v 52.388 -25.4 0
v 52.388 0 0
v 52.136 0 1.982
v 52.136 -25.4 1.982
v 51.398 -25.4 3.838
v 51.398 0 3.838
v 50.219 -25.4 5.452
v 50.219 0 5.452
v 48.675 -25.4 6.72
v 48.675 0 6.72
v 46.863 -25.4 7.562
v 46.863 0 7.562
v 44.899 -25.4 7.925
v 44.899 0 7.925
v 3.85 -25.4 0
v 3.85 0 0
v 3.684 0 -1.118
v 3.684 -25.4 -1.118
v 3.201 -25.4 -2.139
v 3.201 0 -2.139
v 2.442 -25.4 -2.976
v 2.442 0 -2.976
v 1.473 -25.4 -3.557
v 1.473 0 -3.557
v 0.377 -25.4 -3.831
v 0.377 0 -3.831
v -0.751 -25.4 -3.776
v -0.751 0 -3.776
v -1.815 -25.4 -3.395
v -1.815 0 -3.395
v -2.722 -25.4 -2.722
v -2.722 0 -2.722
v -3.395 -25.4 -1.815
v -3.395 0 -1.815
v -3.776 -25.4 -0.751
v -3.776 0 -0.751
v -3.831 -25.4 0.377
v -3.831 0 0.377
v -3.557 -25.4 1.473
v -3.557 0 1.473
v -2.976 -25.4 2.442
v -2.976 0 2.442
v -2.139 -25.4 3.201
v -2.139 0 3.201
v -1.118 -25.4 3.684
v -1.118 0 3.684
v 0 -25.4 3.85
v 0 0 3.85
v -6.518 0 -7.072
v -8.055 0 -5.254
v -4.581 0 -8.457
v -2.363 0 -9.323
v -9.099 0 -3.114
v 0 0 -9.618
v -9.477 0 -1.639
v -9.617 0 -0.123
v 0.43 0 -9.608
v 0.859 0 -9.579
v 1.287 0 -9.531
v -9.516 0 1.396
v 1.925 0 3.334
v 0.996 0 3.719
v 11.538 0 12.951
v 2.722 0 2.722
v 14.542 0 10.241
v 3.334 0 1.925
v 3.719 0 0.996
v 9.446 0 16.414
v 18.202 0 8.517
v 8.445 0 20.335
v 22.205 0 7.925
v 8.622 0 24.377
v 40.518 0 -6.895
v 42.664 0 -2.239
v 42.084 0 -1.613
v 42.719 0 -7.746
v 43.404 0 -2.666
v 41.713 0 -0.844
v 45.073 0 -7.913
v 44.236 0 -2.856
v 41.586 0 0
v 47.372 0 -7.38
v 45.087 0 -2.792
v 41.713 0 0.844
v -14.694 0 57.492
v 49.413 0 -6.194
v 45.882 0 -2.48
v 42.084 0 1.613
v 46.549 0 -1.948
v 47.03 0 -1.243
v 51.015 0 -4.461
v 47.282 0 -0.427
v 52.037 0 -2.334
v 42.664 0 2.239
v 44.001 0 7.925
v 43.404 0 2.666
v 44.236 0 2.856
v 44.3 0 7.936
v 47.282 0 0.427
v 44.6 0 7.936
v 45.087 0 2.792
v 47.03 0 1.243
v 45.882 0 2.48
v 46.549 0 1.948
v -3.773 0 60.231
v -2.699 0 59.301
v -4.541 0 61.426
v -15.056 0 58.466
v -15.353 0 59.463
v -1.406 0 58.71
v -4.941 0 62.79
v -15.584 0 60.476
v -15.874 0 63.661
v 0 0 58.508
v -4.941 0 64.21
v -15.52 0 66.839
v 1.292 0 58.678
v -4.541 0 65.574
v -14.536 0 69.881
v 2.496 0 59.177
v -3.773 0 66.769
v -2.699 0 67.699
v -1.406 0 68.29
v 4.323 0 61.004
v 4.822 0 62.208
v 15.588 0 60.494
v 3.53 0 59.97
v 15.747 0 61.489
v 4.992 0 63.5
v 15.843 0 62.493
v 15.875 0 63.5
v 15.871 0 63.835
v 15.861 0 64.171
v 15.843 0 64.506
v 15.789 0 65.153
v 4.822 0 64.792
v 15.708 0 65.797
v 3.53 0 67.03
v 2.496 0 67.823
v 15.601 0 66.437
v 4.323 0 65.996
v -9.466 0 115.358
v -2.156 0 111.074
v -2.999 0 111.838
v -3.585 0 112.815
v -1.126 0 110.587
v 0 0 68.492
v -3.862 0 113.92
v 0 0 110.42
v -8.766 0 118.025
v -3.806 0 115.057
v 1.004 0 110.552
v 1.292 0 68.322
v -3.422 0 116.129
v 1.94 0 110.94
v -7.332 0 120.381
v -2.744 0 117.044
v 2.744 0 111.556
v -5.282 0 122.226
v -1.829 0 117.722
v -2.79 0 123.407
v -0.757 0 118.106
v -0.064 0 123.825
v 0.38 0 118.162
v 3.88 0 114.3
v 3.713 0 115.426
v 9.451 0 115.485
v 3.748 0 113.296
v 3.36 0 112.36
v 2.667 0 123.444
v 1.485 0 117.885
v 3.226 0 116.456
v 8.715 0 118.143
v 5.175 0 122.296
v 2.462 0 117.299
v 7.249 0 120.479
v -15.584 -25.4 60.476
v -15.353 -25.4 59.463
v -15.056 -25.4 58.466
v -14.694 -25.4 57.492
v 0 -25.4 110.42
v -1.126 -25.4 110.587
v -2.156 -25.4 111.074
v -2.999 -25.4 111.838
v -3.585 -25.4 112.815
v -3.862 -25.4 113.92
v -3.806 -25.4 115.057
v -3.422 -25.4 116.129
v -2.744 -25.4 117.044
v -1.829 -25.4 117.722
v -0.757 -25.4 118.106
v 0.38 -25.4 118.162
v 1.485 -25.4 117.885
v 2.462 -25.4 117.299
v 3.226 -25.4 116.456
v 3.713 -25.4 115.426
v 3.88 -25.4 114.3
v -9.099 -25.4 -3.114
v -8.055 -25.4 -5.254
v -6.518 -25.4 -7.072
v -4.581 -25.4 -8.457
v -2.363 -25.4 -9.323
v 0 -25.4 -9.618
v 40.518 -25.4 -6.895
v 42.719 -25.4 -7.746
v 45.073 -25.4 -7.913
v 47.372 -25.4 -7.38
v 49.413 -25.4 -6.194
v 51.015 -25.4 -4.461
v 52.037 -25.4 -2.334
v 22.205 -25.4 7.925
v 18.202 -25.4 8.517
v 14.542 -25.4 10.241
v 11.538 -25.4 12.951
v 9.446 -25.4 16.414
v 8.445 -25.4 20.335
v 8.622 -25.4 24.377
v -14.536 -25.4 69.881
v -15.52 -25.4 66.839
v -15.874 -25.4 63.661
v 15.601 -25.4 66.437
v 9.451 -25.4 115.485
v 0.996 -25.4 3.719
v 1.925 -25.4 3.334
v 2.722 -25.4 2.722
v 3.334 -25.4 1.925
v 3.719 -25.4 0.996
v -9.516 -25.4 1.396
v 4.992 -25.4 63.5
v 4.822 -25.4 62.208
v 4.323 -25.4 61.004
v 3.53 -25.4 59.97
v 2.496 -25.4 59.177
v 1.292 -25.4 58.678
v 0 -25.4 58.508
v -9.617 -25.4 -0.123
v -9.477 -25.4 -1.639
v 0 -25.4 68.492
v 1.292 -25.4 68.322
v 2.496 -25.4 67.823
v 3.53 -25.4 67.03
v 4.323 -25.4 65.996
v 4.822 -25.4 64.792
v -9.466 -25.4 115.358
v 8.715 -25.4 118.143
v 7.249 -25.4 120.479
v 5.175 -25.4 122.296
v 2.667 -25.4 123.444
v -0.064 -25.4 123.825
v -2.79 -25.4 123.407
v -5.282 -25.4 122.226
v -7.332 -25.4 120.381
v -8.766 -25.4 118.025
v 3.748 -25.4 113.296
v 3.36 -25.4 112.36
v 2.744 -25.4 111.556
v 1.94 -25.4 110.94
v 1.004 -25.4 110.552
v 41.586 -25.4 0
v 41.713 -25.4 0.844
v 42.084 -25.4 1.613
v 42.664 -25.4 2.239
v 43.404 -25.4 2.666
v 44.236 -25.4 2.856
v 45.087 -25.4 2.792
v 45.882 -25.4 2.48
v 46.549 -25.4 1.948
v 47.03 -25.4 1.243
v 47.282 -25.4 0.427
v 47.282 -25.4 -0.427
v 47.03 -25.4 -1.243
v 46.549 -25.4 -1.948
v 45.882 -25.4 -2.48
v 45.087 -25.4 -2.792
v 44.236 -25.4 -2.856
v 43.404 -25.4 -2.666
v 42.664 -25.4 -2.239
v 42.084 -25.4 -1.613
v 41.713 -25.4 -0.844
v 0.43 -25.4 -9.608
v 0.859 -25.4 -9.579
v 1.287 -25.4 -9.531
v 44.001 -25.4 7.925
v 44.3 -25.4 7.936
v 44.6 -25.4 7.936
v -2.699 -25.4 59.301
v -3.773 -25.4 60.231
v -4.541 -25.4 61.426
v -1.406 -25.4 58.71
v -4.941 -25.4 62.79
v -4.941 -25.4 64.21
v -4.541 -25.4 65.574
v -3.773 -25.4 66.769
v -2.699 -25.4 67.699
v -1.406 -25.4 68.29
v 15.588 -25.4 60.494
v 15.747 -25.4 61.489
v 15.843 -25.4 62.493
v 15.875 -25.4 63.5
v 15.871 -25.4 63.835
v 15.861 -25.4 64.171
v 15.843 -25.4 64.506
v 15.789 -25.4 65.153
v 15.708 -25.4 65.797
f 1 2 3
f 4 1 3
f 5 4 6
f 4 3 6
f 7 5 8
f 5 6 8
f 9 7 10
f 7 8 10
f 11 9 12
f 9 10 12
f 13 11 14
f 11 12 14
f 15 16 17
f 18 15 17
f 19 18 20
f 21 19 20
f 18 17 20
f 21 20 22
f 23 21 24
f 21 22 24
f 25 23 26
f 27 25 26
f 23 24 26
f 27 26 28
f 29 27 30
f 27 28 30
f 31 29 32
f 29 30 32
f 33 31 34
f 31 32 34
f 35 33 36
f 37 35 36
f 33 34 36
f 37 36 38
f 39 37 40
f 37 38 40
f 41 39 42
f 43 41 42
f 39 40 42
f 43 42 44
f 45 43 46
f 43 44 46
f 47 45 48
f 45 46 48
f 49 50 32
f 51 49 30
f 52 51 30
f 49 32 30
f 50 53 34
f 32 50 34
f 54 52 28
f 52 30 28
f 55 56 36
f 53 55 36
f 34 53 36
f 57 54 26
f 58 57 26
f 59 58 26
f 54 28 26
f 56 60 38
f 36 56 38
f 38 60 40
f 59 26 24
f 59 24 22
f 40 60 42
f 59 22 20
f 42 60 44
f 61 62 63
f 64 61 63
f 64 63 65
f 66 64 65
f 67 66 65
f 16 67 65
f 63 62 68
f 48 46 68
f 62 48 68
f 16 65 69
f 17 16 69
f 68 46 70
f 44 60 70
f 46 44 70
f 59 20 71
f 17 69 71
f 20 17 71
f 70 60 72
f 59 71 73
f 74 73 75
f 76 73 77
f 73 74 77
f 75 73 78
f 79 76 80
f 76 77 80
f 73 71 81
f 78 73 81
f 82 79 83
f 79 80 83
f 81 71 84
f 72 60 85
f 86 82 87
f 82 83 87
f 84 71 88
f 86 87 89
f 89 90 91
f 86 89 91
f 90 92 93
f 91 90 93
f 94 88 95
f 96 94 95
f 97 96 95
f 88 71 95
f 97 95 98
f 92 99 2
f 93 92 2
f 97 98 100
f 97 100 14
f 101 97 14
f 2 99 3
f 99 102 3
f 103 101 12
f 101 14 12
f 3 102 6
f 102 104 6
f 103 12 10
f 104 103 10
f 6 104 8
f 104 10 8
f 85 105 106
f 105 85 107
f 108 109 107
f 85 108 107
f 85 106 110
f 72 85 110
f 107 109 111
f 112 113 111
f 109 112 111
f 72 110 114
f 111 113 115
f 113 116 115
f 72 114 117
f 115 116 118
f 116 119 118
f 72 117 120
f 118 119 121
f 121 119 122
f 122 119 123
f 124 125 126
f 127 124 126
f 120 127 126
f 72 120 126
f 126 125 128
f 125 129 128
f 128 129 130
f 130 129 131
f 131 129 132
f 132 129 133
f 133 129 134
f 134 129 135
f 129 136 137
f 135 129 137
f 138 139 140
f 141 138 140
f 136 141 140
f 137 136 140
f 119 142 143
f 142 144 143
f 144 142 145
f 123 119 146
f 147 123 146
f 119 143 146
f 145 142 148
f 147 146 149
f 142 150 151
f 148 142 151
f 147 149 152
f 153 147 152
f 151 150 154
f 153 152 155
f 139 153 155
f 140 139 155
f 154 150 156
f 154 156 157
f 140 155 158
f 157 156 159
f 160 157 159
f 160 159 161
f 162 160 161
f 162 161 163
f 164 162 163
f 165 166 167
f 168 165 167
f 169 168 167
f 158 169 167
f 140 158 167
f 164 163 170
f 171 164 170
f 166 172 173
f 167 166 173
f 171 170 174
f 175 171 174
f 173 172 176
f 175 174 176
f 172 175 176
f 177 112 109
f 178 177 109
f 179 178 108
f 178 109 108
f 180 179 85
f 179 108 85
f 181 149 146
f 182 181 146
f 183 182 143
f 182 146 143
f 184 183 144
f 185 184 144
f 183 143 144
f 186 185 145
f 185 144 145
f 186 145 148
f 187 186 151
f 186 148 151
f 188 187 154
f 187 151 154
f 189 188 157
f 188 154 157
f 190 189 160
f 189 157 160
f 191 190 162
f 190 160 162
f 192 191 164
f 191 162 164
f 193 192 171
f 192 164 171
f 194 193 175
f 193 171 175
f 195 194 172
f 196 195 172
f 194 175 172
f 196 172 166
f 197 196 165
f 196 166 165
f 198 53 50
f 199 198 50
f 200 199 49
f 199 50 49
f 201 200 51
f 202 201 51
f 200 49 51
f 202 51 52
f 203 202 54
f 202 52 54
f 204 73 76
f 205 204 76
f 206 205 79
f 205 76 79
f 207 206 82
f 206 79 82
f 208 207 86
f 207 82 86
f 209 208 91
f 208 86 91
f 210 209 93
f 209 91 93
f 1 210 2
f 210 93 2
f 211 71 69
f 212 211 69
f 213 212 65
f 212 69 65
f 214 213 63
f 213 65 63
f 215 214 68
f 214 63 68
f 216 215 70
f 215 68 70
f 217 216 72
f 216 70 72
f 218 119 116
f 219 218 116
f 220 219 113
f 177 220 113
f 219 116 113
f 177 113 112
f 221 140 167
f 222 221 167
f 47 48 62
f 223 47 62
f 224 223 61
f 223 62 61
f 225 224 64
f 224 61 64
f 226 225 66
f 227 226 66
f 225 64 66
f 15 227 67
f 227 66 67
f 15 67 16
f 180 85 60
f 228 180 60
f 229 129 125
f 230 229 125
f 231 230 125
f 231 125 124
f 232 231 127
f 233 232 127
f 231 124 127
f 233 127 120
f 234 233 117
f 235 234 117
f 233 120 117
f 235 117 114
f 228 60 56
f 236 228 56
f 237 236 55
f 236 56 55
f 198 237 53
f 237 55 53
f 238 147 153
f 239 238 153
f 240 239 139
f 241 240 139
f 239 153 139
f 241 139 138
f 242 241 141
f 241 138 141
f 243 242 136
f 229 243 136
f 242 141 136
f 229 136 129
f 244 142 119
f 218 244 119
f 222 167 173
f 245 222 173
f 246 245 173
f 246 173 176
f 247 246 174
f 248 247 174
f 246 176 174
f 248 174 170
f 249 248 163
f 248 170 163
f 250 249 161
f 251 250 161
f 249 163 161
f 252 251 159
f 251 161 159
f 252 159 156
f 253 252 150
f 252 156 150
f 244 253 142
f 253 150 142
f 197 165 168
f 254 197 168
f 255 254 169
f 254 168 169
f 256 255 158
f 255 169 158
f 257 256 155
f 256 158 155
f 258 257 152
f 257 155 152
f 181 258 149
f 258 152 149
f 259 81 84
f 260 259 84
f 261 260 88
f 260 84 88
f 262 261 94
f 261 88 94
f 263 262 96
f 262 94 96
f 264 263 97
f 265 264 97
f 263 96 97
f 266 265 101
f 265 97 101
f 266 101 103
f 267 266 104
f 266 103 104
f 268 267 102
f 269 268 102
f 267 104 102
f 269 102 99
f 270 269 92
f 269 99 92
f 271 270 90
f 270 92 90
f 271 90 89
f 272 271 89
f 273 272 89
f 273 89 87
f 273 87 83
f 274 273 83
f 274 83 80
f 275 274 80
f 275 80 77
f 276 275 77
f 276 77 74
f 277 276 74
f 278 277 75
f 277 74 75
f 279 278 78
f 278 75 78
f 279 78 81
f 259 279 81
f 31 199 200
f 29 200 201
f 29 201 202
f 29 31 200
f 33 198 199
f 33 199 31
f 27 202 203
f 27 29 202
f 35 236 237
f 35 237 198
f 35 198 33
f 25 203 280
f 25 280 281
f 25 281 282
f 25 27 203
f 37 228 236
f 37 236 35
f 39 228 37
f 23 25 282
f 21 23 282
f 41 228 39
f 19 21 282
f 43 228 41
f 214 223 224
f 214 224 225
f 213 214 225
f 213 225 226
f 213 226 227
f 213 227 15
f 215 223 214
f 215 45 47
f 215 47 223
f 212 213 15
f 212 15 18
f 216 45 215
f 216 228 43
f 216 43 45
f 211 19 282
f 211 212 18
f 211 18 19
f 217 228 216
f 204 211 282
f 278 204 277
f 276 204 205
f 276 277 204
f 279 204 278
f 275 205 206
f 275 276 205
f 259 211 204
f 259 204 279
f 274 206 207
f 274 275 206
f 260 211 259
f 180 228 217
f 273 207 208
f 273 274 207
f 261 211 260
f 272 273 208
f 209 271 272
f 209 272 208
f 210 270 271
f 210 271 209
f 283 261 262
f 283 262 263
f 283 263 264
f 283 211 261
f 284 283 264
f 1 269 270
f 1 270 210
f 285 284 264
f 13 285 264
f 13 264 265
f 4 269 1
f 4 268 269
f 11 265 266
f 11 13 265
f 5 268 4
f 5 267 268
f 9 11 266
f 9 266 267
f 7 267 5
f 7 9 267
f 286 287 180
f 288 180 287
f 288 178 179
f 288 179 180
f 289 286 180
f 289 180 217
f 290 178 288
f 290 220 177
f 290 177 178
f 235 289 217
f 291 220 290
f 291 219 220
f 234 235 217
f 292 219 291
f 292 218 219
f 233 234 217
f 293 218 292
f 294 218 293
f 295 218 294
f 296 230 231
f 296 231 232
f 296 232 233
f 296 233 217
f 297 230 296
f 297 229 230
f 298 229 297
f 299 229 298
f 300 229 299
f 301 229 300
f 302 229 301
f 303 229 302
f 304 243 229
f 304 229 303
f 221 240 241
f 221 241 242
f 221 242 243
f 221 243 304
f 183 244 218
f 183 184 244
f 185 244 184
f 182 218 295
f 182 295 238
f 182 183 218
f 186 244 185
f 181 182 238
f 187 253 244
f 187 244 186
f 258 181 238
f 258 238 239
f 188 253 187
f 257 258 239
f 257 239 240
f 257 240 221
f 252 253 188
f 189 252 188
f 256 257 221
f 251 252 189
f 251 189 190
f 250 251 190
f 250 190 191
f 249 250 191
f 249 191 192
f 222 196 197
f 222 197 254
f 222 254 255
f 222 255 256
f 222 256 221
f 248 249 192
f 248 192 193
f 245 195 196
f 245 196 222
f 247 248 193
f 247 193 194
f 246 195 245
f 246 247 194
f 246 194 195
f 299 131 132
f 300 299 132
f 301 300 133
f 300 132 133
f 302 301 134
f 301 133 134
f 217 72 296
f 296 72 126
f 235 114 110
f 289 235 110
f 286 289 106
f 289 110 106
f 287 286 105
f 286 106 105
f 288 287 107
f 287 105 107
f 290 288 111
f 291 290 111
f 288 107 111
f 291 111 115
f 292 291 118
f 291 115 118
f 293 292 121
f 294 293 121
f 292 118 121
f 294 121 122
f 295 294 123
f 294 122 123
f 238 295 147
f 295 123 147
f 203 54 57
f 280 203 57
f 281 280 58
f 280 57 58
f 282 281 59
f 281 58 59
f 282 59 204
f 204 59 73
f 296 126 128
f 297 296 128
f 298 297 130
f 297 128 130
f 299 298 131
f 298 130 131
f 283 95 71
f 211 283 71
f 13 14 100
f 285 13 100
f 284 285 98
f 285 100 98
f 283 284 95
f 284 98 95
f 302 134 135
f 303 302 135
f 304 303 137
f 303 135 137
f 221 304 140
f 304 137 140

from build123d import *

# Parameters (mm, degrees)
F1_DEPTH = 25.4


with BuildPart() as f1:
    # F0 (on Front) → F1 (new body)
    with BuildSketch(Plane.XZ):
        with BuildLine():
            Line((-9.0993962158, -3.1143001494), (-9.5157433692, 1.3958886217))
            ThreePointArc((-9.5157433692, 1.3958886217), (-9.5768630631, -0.8840649199), (-9.0993962158, -3.1143001494))
        make_face()
        with BuildLine():
            ThreePointArc((0, -9.6175816561), (0.6447692536, -9.5959444309), (1.2866373584, -9.5311301124))
            Line((1.2866373584, -9.5311301124), (0, -9.6175816561))
        make_face()
        with BuildLine():
            ThreePointArc((44.8987295624, 7.924805867), (44.45, 7.9375), (44.0012704376, 7.924805867))
            Line((44.0012704376, 7.924805867), (44.8987295624, 7.924805867))
        make_face()
        with BuildLine():
            Line((15.6009559029, 66.4369712147), (15.8431126272, 64.5056874674))
            ThreePointArc((15.8431126272, 64.5056874674), (15.7516610445, 65.4750441364), (15.6009559029, 66.4369712147))
        make_face()
        with BuildLine():
            ThreePointArc((-14.535897452, 69.8814818237), (-15.7772599915, 65.2588894677), (-15.5843994353, 60.4764062373))
            Line((-15.5843994353, 60.4764062373), (-14.535897452, 69.8814818237))
        make_face()
        with BuildLine():
            ThreePointArc((-9.5157433692, 1.3958886217), (-6.2877978701, 7.2774634906), (0, 9.6175816561))
            Line((0, 9.6175816561), (0, 47.625))
            ThreePointArc((0, 47.625), (-8.849704349, 50.3205327143), (-14.6940962464, 57.4917423074))
            Line((-14.6940962464, 57.4917423074), (-9.5157433692, 1.3958886217))
        make_face()
        with BuildLine():
            ThreePointArc((-14.535897452, 69.8814818237), (-8.6807142865, 76.7913815864), (0, 79.375))
            Line((0, 79.375), (0, 104.775))
            ThreePointArc((0, 104.775), (-7.0993647554, 107.9498310991), (-9.4660714511, 115.357882925))
            Line((-9.4660714511, 115.357882925), (-14.535897452, 69.8814818237))
        make_face()
        with BuildLine():
            Line((0, 104.775), (0, 79.375))
            ThreePointArc((0, 79.375), (10.1338839289, 75.7196571767), (15.6009559029, 66.4369712147))
            Line((15.6009559029, 66.4369712147), (9.4509966267, 115.4850264818))
            ThreePointArc((9.4509966267, 115.4850264818), (9.5064811542, 114.8936674705), (9.525, 114.3))
            ThreePointArc((9.525, 114.3), (6.7351920908, 107.5648079092), (0, 104.775))
        make_face()
        with BuildLine():
            Line((36.5125, 0), (9.6175816561, 0))
            ThreePointArc((9.6175816561, 0), (7.2412780905, -6.3294366675), (1.2866373584, -9.5311301124))
            Line((1.2866373584, -9.5311301124), (40.5179037022, -6.8951087704))
            ThreePointArc((40.5179037022, -6.8951087704), (37.5865125259, -3.9870347306), (36.5125, 0))
        make_face()
        with BuildLine():
            ThreePointArc((9.4509966267, 115.4850264818), (-0.064017057, 123.8247848698), (-9.4660714511, 115.357882925))
            ThreePointArc((-9.4660714511, 115.357882925), (-7.0993647554, 107.9498310991), (0, 104.775))
            ThreePointArc((0, 104.775), (6.7351920908, 107.5648079092), (9.525, 114.3))
            ThreePointArc((9.525, 114.3), (9.5064811542, 114.8936674705), (9.4509966267, 115.4850264818))
        make_face()
        with BuildLine():
            ThreePointArc((3.8802388174, 114.3), (2.7437431804, 111.5562568196), (0, 110.4197611826))
            ThreePointArc((0, 110.4197611826), (-2.7437431804, 117.0437431804), (3.8802388174, 114.3))
        make_face(mode=Mode.SUBTRACT)
        with BuildLine():
            ThreePointArc((44.0012704376, 7.924805867), (38.680871073, 5.4517022731), (36.5125, 0))
            ThreePointArc((36.5125, 0), (37.5865125259, -3.9870347306), (40.5179037022, -6.8951087704))
            ThreePointArc((40.5179037022, -6.8951087704), (48.4370347306, -6.8634874741), (52.3875, 0))
            ThreePointArc((52.3875, 0), (50.219128927, 5.4517022731), (44.8987295624, 7.924805867))
            Line((44.8987295624, 7.924805867), (44.0012704376, 7.924805867))
        make_face()
        with BuildLine():
            ThreePointArc((47.3139224762, 0), (44.45, -2.8639224762), (41.5860775238, 0))
            ThreePointArc((41.5860775238, 0), (44.45, 2.8639224762), (47.3139224762, 0))
        make_face(mode=Mode.SUBTRACT)
        with BuildLine():
            Line((0, 58.5082662054), (0, 47.625))
            ThreePointArc((0, 47.625), (10.1067179605, 51.2578646852), (15.5877554471, 60.4937556452))
            ThreePointArc((15.5877554471, 60.4937556452), (15.8030257027, 61.9900319081), (15.875, 63.5))
            ThreePointArc((15.875, 63.5), (15.8670261542, 64.0030964338), (15.8431126272, 64.5056874674))
            Line((15.8431126272, 64.5056874674), (15.6009559029, 66.4369712147))
            ThreePointArc((15.6009559029, 66.4369712147), (10.1338839289, 75.7196571767), (0, 79.375))
            Line((0, 79.375), (0, 68.4917337946))
            ThreePointArc((0, 68.4917337946), (3.5296888161, 67.0296888161), (4.9917337946, 63.5))
            ThreePointArc((4.9917337946, 63.5), (3.5296888161, 59.9703111839), (0, 58.5082662054))
        make_face()
        with BuildLine():
            ThreePointArc((-14.6940962464, 57.4917423074), (-8.849704349, 50.3205327143), (0, 47.625))
            Line((0, 47.625), (0, 58.5082662054))
            ThreePointArc((0, 58.5082662054), (-4.9917337946, 63.5), (0, 68.4917337946))
            Line((0, 68.4917337946), (0, 79.375))
            ThreePointArc((0, 79.375), (-8.6807142865, 76.7913815864), (-14.535897452, 69.8814818237))
            Line((-14.535897452, 69.8814818237), (-15.5843994353, 60.4764062373))
            ThreePointArc((-15.5843994353, 60.4764062373), (-15.2126223867, 58.9621871877), (-14.6940962464, 57.4917423074))
        make_face()
        with BuildLine():
            ThreePointArc((3.8500225809, 0), (-2.7223770747, -2.7223770747), (0, 3.8500225809))
            Line((0, 3.8500225809), (0, 9.6175816561))
            ThreePointArc((0, 9.6175816561), (-6.2877978701, 7.2774634906), (-9.5157433692, 1.3958886217))
            Line((-9.5157433692, 1.3958886217), (-9.0993962158, -3.1143001494))
            ThreePointArc((-9.0993962158, -3.1143001494), (-5.5922196364, -7.8246377839), (0, -9.6175816561))
            Line((0, -9.6175816561), (1.2866373584, -9.5311301124))
            ThreePointArc((1.2866373584, -9.5311301124), (7.2412780905, -6.3294366675), (9.6175816561, 0))
            Line((9.6175816561, 0), (3.8500225809, 0))
        make_face()
        with BuildLine():
            Line((0, 47.625), (0, 9.6175816561))
            ThreePointArc((0, 9.6175816561), (6.8006572076, 6.8006572076), (9.6175816561, 0))
            Line((9.6175816561, 0), (36.5125, 0))
            ThreePointArc((36.5125, 0), (38.680871073, 5.4517022731), (44.0012704376, 7.924805867))
            Line((44.0012704376, 7.924805867), (22.2047249099, 7.924805867))
            ThreePointArc((22.2047249099, 7.924805867), (11.5375167972, 12.9510094978), (8.6223042709, 24.3770143895))
            Line((8.6223042709, 24.3770143895), (15.5877554471, 60.4937556452))
            ThreePointArc((15.5877554471, 60.4937556452), (10.1067179605, 51.2578646852), (0, 47.625))
        make_face()
        with BuildLine():
            Line((0, 9.6175816561), (0, 3.8500225809))
            ThreePointArc((0, 3.8500225809), (2.7223770747, 2.7223770747), (3.8500225809, 0))
            Line((3.8500225809, 0), (9.6175816561, 0))
            ThreePointArc((9.6175816561, 0), (6.8006572076, 6.8006572076), (0, 9.6175816561))
        make_face()
    extrude(amount=F1_DEPTH)


solid = f1.part
